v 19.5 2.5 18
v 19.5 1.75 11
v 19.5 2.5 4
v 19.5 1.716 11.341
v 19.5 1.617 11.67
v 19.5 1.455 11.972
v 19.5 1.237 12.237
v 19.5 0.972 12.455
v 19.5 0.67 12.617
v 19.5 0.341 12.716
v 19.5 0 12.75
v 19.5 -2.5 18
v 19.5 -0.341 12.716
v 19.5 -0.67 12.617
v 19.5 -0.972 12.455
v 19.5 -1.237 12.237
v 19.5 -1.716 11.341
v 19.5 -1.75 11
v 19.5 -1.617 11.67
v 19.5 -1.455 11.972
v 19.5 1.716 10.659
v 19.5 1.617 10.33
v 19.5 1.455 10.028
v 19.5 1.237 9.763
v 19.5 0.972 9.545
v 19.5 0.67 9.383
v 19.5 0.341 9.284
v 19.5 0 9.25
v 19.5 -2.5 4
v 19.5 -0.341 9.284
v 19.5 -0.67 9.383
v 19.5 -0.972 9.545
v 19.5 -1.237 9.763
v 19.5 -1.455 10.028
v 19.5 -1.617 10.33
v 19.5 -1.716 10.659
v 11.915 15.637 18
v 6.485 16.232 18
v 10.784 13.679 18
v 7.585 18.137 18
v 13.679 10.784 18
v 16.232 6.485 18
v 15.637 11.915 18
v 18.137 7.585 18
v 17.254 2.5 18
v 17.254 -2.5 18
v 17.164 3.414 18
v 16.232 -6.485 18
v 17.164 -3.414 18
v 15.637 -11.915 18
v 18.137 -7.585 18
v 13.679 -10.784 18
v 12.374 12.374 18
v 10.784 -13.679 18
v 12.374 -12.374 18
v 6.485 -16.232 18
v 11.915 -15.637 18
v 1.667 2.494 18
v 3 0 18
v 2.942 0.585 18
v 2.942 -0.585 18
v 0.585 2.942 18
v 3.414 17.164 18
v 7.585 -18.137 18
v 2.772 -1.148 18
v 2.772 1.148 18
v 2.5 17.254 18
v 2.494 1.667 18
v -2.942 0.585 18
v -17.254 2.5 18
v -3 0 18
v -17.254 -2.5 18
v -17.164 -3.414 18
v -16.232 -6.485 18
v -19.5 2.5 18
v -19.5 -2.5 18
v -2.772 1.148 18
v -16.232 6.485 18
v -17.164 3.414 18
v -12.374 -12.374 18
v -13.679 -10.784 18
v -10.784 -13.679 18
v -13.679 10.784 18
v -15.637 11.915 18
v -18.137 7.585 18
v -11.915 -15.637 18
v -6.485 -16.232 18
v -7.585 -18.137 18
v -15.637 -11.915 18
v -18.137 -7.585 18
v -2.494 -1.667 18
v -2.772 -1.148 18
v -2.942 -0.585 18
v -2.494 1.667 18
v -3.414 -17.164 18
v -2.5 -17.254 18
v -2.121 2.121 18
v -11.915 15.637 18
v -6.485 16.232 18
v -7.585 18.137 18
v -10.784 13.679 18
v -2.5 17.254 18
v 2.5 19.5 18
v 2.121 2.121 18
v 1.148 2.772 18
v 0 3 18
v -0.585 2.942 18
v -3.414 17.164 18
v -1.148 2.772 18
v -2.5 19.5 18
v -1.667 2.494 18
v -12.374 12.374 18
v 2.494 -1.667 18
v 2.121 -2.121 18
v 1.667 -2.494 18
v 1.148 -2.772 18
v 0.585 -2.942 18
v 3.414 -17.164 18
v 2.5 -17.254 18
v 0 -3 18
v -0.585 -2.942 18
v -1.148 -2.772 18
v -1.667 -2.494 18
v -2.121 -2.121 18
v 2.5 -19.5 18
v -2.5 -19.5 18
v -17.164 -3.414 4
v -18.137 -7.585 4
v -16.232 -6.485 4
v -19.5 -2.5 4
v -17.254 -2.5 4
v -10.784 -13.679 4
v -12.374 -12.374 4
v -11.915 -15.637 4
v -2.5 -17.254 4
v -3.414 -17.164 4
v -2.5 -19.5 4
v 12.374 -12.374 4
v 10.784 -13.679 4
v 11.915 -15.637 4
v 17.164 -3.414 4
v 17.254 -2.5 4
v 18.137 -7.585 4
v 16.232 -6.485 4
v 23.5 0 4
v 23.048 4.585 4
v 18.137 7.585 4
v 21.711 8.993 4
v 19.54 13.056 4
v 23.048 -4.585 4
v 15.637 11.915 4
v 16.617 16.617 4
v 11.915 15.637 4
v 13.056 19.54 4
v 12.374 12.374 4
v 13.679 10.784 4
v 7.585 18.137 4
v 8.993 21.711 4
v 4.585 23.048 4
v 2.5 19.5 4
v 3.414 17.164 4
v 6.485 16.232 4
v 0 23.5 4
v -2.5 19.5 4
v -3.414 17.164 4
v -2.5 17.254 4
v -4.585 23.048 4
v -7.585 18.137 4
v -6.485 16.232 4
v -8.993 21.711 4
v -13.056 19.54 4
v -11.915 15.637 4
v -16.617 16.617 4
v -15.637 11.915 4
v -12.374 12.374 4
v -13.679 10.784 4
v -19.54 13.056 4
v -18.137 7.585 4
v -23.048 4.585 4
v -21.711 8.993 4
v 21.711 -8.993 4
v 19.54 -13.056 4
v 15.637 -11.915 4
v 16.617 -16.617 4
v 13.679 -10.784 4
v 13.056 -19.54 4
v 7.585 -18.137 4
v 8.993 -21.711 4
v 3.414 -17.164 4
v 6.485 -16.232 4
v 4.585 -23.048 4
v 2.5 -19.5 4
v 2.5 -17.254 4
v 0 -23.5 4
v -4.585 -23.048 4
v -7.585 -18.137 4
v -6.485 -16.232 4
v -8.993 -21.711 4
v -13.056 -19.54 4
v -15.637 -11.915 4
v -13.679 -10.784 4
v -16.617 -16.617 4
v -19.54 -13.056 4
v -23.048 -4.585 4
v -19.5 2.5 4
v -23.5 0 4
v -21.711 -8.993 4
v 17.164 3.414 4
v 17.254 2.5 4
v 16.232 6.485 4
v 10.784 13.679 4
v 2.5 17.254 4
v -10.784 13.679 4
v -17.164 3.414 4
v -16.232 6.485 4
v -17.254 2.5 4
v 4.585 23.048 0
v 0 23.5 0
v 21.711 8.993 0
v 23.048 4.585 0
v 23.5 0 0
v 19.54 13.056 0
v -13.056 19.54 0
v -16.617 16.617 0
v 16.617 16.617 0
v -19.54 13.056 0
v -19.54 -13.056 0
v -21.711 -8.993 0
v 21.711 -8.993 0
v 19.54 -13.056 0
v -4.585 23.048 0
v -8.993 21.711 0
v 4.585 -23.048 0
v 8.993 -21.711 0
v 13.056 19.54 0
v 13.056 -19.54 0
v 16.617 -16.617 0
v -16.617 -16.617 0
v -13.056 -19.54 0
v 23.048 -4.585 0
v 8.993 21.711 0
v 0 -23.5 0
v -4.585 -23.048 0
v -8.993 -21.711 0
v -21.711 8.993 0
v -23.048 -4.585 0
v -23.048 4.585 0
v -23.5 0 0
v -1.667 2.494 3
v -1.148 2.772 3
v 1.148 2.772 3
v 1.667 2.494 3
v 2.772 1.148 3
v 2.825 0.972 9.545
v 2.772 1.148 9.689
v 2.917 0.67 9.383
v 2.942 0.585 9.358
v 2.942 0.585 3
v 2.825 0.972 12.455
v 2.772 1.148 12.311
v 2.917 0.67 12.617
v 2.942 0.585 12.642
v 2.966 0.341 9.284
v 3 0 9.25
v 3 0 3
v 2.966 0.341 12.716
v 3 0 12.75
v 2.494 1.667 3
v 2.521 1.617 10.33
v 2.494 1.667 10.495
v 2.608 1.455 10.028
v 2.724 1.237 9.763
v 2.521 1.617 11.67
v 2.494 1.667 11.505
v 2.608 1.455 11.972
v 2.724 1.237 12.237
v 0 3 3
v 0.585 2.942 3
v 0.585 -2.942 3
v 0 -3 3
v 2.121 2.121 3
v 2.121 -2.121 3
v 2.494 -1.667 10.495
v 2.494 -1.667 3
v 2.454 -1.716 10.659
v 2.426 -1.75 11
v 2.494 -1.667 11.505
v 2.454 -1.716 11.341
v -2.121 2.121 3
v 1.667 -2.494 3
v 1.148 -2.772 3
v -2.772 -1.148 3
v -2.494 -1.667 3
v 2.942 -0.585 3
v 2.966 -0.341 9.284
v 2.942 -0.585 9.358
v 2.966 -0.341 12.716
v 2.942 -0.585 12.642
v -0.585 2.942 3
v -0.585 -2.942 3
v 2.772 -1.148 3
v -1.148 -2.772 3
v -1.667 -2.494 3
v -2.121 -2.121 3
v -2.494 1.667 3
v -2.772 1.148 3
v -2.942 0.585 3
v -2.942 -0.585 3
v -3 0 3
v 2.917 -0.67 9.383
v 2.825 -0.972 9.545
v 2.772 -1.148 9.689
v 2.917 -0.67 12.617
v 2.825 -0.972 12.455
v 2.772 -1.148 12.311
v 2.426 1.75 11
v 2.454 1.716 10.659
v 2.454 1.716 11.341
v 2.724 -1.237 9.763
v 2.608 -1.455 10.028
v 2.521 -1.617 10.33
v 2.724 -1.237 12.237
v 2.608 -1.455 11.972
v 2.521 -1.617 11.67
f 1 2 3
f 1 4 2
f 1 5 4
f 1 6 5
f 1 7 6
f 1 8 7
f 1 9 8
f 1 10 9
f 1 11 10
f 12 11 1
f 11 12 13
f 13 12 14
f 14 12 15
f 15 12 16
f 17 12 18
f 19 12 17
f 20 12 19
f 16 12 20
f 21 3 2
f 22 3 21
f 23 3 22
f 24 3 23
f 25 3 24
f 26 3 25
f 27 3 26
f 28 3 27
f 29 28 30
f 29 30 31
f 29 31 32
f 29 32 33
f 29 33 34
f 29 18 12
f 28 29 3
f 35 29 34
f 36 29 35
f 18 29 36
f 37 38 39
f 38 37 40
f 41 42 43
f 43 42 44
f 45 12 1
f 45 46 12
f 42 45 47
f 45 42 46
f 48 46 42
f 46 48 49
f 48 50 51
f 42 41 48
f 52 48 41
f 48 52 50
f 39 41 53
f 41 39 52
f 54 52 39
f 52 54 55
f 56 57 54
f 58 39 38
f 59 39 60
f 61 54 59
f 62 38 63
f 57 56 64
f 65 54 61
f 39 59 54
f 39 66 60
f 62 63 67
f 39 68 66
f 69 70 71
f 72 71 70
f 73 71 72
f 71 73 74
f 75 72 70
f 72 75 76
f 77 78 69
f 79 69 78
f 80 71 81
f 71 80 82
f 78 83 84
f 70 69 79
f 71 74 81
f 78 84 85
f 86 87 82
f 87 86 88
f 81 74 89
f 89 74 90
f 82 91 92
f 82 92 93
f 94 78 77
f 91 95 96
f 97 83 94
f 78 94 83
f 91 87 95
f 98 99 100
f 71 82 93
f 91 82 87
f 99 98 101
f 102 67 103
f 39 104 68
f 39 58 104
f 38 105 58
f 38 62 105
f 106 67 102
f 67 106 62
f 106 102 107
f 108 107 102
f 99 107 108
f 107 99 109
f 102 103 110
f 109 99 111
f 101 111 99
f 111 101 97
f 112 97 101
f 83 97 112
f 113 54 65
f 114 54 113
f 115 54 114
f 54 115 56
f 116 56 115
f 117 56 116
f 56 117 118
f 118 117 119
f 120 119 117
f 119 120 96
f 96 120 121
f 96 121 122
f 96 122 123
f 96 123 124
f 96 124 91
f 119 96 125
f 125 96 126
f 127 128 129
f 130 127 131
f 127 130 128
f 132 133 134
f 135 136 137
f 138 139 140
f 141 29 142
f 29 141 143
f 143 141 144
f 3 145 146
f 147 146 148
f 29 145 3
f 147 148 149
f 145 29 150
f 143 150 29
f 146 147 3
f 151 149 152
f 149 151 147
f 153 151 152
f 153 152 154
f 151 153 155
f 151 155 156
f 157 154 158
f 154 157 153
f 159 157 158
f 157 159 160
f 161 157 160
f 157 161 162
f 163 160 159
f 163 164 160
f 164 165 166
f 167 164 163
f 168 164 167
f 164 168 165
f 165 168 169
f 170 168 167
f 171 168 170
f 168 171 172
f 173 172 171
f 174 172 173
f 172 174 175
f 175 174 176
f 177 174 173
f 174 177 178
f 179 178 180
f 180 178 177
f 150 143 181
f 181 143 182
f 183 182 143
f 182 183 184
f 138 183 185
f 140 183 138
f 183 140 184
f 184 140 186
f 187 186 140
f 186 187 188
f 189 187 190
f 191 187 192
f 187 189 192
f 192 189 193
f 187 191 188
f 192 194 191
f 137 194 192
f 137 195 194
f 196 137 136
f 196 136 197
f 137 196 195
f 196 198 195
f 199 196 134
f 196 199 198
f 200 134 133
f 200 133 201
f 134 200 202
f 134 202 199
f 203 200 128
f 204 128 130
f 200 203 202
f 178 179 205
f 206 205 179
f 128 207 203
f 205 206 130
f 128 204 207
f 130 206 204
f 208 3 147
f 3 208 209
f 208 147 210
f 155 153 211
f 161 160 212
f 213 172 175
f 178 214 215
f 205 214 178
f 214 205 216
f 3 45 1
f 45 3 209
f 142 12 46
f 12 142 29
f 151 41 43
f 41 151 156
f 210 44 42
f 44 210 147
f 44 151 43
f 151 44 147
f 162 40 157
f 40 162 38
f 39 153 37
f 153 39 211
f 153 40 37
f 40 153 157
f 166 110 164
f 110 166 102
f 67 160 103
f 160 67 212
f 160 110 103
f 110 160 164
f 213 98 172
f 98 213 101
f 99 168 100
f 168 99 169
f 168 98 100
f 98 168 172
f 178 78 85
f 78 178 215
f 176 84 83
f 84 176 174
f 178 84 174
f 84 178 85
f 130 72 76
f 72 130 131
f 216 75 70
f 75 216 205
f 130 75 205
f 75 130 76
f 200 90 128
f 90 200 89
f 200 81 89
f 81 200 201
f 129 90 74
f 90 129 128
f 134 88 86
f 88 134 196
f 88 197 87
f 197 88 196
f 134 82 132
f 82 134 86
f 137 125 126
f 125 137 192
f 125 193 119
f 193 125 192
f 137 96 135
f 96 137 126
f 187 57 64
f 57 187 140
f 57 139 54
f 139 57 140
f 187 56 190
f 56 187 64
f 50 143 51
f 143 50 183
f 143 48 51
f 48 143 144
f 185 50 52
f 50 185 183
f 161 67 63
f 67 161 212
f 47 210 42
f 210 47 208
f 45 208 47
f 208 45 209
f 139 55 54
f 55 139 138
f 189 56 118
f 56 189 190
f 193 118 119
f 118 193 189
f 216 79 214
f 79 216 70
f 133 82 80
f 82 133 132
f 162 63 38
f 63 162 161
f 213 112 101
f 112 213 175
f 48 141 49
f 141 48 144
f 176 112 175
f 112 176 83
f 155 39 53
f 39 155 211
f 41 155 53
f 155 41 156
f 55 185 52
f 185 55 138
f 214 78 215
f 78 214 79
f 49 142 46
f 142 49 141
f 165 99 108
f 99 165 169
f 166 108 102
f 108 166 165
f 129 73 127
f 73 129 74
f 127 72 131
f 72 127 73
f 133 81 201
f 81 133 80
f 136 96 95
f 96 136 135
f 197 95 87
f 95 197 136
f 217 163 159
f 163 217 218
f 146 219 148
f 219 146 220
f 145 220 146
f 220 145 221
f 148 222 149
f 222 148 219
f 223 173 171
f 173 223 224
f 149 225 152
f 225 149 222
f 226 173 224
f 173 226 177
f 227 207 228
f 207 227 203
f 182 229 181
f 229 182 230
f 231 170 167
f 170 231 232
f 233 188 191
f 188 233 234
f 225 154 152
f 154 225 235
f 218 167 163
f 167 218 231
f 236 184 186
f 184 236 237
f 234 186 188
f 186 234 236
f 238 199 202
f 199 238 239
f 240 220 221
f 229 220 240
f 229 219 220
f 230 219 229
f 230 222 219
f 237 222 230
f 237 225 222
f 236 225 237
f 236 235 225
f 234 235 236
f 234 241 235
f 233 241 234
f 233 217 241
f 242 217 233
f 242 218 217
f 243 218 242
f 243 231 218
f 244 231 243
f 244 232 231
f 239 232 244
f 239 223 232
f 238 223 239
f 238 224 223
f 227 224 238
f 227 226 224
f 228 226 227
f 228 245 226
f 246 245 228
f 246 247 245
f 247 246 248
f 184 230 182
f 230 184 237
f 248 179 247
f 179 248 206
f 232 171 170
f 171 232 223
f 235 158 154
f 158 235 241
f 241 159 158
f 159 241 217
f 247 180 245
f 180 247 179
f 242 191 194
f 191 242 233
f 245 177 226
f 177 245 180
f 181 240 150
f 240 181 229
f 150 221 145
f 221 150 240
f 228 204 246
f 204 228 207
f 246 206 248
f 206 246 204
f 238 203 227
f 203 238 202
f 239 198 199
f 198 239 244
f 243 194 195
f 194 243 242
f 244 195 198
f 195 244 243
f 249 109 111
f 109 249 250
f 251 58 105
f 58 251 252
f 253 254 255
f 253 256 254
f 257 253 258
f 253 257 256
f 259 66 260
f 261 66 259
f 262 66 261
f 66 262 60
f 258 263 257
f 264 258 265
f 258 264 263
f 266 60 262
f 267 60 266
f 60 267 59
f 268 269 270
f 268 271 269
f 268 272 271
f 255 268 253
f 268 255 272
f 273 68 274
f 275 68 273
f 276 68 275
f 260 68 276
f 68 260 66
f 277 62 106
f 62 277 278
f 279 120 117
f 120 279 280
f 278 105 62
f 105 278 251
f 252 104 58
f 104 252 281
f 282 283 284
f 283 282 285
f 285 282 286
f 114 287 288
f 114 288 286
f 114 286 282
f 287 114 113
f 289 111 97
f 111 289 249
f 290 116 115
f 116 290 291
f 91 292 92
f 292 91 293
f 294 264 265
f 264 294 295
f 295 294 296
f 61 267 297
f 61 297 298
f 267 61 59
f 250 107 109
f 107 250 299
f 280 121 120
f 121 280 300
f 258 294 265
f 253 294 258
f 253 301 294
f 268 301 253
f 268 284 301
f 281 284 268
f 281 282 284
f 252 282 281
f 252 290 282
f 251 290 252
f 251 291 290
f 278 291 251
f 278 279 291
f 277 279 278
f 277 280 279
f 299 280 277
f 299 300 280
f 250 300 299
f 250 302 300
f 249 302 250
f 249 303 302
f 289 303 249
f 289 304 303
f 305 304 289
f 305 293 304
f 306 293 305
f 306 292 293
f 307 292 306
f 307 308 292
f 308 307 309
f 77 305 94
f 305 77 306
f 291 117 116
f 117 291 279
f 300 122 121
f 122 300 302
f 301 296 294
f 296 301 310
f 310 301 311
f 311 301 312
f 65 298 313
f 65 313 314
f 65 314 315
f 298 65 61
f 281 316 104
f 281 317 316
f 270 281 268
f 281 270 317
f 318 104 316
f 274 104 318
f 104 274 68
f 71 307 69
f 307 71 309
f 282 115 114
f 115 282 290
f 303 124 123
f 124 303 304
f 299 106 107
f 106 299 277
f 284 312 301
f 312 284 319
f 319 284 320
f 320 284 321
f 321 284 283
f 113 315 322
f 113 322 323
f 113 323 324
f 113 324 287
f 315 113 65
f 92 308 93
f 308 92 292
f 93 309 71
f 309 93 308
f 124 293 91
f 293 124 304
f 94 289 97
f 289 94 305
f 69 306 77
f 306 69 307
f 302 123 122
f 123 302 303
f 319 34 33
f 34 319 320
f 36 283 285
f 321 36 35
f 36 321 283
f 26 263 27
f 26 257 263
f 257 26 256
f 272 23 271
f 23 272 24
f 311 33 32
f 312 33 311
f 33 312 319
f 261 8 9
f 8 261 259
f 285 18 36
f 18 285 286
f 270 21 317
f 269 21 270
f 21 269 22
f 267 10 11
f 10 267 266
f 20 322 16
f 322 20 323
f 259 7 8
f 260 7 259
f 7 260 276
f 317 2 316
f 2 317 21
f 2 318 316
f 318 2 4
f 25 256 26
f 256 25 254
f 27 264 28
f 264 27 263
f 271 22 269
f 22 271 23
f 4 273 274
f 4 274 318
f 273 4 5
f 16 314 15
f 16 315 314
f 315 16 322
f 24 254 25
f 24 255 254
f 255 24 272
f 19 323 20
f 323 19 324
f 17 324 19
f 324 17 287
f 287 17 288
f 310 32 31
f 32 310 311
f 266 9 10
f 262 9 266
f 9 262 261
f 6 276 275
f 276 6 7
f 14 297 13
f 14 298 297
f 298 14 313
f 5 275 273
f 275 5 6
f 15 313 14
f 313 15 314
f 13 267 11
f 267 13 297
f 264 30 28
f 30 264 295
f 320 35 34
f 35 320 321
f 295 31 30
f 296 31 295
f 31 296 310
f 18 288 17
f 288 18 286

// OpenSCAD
$fn = 32;

// ----------------------------------------------------------------------
// Control knob: skirt knob with grip ribs
// ----------------------------------------------------------------------

// --- parameters (mm) ---
skirt_d = 47;             // skirt diameter
skirt_t = 4;              // skirt thickness
rib_w = 5;                // grip rib width
rib_out = 3;              // grip rib radial protrusion
n_ribs = 12;              // number of grip ribs
knob_d = 35;              // knob body diameter
knob_h = 14;              // knob body height
bore_d = 6;               // shaft bore diameter
set_d = 3.5;              // set screw bore diameter
fit_tol = 0.02;           // tolerance for press fits, mm
free_tol = 0.2;           // tolerance for clearance fits, mm

rib_step = 360 / n_ribs;  // rib angular step
total_h = skirt_t + knob_h;  // overall height

difference() {
  union() {
    translate([0, 0, skirt_t]) cylinder(h = knob_h, d = knob_d);
    cylinder(h = skirt_t, d = skirt_d);
    for (i = [0 : n_ribs - 1])
      rotate([0, 0, i * rib_step])
        translate([knob_d / 2 - 1, -rib_w / 2, skirt_t])
          cube([rib_out, rib_w, knob_h]);
  }
  translate([0, 0, skirt_t - 1]) cylinder(h = knob_h + 2, d = bore_d);
  translate([-1, 0, skirt_t + knob_h / 2]) rotate([0, 90, 0])
    cylinder(h = knob_d / 2 + bore_d / 2 + 2, d = set_d);
}
